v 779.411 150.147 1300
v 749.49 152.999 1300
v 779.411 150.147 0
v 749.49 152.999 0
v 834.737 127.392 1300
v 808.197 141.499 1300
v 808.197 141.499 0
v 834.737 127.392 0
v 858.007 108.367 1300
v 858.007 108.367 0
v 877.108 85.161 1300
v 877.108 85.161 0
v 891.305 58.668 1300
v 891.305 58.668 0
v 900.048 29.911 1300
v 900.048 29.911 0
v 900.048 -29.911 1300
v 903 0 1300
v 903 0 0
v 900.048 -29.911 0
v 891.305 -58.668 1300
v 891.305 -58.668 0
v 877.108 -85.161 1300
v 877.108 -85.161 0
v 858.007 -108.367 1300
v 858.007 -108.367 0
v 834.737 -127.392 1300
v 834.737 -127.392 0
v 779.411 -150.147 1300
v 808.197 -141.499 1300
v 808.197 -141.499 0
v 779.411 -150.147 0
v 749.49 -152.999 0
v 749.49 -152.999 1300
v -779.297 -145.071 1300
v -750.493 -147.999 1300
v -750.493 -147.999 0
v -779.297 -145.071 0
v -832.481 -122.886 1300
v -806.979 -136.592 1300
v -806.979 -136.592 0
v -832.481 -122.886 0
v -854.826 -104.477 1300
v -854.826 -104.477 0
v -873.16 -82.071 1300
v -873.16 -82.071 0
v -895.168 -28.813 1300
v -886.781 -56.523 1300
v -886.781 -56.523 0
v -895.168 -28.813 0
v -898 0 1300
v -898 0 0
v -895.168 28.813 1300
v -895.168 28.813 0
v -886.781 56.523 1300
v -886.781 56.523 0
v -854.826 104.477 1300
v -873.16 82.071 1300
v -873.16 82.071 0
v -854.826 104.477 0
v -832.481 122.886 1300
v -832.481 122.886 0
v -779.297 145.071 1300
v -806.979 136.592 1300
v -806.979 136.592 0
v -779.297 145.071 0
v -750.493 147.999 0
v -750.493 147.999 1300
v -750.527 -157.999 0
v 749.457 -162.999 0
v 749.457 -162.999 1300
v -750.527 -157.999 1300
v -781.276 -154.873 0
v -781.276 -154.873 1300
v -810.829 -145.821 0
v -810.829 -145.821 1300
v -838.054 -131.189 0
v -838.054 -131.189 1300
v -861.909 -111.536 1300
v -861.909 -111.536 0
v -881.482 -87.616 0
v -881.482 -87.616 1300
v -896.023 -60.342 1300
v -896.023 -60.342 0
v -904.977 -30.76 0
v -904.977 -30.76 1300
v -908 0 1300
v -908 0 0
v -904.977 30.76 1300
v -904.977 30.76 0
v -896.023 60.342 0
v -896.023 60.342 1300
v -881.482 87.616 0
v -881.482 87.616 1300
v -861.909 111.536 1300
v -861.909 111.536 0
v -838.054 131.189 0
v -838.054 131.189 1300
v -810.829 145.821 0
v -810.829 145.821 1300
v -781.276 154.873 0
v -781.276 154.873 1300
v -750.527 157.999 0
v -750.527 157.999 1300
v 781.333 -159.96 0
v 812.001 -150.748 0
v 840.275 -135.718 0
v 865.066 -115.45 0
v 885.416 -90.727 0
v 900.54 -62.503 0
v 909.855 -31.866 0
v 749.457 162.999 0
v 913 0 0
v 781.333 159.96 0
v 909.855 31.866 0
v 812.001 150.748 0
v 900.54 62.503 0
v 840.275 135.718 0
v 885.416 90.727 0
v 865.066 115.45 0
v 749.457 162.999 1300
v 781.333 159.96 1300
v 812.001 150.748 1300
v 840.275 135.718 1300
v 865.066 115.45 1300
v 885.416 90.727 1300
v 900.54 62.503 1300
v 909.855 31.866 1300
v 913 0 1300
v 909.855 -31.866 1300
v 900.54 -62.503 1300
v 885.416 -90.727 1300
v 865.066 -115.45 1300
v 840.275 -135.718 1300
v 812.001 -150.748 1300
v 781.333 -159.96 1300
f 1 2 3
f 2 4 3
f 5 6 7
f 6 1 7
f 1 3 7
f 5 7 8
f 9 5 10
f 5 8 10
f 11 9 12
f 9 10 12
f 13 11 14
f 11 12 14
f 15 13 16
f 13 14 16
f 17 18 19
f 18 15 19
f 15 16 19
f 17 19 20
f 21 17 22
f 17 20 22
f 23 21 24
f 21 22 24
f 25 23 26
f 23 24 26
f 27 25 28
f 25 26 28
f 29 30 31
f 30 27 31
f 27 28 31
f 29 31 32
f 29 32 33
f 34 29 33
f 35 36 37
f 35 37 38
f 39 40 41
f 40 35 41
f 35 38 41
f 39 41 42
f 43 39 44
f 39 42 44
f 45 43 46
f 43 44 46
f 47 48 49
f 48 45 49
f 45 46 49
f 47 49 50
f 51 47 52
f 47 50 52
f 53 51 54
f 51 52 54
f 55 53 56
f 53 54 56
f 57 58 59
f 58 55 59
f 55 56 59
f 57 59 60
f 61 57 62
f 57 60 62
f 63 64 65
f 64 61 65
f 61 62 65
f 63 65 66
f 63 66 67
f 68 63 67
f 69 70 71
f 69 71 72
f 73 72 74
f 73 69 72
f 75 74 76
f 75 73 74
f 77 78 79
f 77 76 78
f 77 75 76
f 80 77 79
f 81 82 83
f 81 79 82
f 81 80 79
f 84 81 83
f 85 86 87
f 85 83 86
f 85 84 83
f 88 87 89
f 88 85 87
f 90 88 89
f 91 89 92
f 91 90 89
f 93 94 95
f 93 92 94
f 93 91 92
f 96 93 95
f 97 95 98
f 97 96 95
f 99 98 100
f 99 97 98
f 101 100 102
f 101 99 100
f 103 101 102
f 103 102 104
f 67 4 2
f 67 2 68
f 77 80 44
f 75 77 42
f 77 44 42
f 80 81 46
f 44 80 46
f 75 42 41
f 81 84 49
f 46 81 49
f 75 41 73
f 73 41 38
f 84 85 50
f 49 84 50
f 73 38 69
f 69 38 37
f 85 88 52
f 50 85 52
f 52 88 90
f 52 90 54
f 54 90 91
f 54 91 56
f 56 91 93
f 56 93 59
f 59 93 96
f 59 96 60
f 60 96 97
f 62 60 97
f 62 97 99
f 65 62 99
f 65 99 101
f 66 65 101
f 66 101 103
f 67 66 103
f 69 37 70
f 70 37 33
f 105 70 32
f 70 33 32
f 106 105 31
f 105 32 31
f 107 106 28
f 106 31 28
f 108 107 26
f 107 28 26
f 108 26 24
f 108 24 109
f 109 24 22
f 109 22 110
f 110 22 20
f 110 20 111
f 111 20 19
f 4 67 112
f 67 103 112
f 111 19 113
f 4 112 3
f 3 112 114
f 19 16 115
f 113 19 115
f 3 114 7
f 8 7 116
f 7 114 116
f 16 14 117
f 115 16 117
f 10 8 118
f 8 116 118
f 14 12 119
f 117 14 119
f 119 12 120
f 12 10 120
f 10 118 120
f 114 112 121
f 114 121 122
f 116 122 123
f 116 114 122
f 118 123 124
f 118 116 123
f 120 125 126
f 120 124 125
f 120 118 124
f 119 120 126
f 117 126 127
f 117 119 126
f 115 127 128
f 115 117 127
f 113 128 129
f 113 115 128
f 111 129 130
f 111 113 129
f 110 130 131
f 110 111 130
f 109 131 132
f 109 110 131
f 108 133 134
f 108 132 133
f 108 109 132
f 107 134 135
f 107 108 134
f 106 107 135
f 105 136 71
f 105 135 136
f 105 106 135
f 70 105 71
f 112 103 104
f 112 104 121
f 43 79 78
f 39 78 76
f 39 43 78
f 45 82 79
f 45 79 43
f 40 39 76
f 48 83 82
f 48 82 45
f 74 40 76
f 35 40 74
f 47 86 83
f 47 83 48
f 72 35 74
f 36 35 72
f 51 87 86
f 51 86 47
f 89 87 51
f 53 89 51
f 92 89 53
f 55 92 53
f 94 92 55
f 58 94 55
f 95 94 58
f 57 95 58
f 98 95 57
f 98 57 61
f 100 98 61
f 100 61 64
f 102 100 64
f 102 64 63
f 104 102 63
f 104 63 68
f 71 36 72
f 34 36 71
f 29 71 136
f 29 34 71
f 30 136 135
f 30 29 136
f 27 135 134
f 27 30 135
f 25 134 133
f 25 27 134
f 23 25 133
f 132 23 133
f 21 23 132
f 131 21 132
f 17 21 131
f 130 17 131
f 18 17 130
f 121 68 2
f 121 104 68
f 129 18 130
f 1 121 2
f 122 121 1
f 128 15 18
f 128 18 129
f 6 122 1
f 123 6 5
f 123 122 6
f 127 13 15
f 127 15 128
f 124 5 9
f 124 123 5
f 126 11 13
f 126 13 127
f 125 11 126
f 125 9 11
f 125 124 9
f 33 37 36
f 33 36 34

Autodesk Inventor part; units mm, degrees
ref_plane "YZ Plane" through (0, 0, 0) normal (1, 0, 0) x (0, 1, 0)
ref_plane "XZ Plane" through (0, 0, 0) normal (0, 1, 0) x (-1, 0, 0)
ref_plane "XY Plane" through (0, 0, 0) normal (0, 0, 1) x (1, 0, 0)
sketch "Boceto1" plane through (0, 0, 0) normal (0, 0, 1) x (1, 0, 0)
  arc A0 (-750.5267, 157.9991) -> (-750.5267, -157.9991) centre (-750, 0) ccw
  arc A1 (749.4567, -162.9991) -> (749.4567, 162.9991) centre (750, 0) ccw
  line L0 (-750.5267, 157.9991) -> (749.4567, 162.9991)
  line L1 (749.4567, -162.9991) -> (-750.5267, -157.9991)
  line L2 (749.49, 152.9991) -> (-750.4933, 147.9992)
  arc A2 (-750.4933, 147.9992) -> (-750.4933, -147.9992) centre (-750, 0) ccw
  line L3 (-750.4933, -147.9992) -> (749.49, -152.9991)
  arc A3 (749.49, -152.9991) -> (749.49, 152.9991) centre (750, 0) ccw
  point P0 (0, 0)
  dimension "d0" = 1500
  dimension "d1" = 326
  dimension "d2" = 316
  dimension "d3" = 750
  dimension "d4" = 10
extrude "Extrusión1" add sketch "Boceto1" along normal blind 1300
equation "\"d3\" = 0.5 * d0"
properties part number "faja"
